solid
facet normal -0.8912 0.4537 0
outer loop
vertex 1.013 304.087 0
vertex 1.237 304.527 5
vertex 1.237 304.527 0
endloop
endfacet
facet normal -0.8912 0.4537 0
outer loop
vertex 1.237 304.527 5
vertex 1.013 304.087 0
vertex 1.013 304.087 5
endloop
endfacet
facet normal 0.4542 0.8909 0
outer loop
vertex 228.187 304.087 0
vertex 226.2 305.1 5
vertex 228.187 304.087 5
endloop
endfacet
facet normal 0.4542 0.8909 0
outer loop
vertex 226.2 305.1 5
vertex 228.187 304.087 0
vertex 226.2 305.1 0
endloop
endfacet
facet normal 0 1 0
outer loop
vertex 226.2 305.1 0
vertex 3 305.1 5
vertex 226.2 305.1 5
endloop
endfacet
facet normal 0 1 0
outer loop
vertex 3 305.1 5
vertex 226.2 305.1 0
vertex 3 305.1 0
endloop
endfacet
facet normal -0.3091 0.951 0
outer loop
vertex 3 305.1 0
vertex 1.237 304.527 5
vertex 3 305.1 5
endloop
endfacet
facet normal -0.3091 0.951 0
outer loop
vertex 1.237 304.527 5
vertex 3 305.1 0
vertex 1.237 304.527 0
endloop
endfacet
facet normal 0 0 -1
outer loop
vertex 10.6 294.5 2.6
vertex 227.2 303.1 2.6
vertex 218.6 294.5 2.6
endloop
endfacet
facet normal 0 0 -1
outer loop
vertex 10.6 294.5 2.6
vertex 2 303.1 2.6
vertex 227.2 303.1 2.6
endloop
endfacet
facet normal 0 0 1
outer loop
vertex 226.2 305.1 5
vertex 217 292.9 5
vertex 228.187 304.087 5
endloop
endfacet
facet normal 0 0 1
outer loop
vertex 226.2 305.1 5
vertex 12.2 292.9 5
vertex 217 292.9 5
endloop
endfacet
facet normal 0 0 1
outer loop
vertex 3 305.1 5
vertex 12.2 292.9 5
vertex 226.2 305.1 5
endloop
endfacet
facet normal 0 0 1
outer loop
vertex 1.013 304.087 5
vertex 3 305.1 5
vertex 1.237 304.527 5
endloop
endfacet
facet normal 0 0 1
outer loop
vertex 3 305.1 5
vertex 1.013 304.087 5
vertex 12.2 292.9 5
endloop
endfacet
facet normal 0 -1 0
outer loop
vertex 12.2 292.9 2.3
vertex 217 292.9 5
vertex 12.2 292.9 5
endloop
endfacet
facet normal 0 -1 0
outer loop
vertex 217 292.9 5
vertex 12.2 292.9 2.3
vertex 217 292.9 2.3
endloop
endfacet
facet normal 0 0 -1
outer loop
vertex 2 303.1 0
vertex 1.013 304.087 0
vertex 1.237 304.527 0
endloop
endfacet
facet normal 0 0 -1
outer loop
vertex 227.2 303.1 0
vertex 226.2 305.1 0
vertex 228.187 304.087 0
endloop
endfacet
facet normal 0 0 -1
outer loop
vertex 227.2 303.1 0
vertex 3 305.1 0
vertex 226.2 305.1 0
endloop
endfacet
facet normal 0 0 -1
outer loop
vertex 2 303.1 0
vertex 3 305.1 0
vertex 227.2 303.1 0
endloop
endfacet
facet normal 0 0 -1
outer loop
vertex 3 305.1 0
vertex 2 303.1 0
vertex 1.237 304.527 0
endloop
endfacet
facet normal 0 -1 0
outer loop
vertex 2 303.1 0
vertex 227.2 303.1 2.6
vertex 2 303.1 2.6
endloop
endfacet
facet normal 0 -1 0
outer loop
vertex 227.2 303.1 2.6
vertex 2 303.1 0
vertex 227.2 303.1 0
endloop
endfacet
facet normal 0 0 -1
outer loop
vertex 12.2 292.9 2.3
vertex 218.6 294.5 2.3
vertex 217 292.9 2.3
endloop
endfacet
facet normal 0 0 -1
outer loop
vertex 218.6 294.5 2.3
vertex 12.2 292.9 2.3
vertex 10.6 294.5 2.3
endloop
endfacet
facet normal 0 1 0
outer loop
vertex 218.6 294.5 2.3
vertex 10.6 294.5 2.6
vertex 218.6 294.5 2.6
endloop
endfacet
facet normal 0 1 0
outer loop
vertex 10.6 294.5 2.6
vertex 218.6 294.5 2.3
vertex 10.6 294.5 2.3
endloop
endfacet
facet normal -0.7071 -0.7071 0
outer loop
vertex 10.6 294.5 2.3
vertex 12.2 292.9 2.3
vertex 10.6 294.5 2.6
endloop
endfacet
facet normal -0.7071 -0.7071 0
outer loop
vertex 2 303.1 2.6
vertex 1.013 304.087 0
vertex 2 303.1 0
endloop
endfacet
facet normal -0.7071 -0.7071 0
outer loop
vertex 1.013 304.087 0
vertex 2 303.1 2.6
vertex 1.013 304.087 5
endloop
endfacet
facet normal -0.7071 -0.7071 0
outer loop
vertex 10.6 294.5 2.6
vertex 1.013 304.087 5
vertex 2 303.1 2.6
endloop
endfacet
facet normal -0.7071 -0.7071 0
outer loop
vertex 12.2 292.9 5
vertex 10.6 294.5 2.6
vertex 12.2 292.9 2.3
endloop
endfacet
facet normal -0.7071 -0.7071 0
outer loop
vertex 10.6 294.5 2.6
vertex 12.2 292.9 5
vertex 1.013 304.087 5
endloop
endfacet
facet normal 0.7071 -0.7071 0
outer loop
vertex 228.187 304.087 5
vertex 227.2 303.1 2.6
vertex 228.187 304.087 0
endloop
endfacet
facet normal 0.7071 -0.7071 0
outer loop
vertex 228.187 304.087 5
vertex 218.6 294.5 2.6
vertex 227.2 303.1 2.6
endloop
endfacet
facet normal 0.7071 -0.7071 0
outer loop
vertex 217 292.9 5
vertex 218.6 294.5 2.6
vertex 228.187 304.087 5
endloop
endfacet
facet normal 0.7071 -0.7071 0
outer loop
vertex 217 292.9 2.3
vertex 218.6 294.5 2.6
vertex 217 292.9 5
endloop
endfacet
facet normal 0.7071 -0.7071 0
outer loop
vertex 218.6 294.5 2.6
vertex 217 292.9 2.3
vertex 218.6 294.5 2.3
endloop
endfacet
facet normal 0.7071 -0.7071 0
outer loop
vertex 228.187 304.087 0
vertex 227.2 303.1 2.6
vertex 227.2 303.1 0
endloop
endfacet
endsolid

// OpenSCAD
// file: common.scad
// ============================================================
// Photo Frame for 13.3" Spectra 6 E-Ink Display
// Shared parameters and utility modules
// ============================================================

/* [Display Parameters] */
// Active (visible) area
active_w = 202.8;
active_h = 270.4;
// Glass outline dimensions
glass_w = 208.8;
glass_h = 284.7;
display_d = 0.85;
// Non-active border (asymmetric)
border_left   = 3.0;
border_right  = 3.0;
border_top    = 3.0;
border_bottom = 11.3;   // 284.7 - 270.4 - 3 = 11.3, FPC side, large non-active area

/* [Driver Board Parameters] */
board_w = 80;
board_h = 40;
board_d = 1.6;
board_clearance = 10;     // component height clearance

/* [Battery Parameters] */
battery_w = 60;
battery_h = 35;
battery_d = 8;

/* [Frame Parameters] */
bezel_w    = 10;          // bezel width around active area
wall_thick = 2.4;         // front frame thickness
back_thick = 1.2;         // back panel thickness (6 layers @ 0.2mm)
frame_d    = 2.6;         // total frame depth (1.2mm back + 1.4mm cavity)
tol        = 0.2;
corner_r   = 3;

/* [Channel Parameters] */
outer_wall  = 2.0;        // outer wall thickness on bezel
inner_lip_d = 0.3;        // inner lip depth (presses on display)
channel_tol = 0.2;        // clearance for back panel in channel
lip_overlap = 2.0;        // how much bezel overlaps the glass on each side

/* [Printer Limits] */
bed_max = 260;

/* [Stand Parameters] */
stand_angle = 12;         // tilt angle in degrees
stand_foot_depth = 100;   // how far the base extends back

/* [FPC Cable] */
// 60-pin FPC exits from bottom of display, offset 2mm to the right
fpc_w = 134;              // FPC ribbon width
fpc_slot_w = fpc_w + 8;   // slot width with clearance (+4mm wider)
fpc_offset_x = 2;         // shifted 2mm to the right from center
fpc_slot_h = 6;

/* [Buttons - 1 reset + 3 custom] */
button_dia     = 3.5;
button_spacing = 12;
button_count   = 4;

/* [Joint Parameters] */
tongue_depth  = 1.2;      // tongue-and-groove interlock depth
tongue_length = 15;        // each tongue segment length
tongue_count  = 4;         // number of tongue segments along width
screw_r       = 1.5;       // M3 screw radius

// ============================================================
// Derived dimensions
// ============================================================

cavity_w = glass_w + 2 * tol;
cavity_h = glass_h + 2 * tol;

frame_w = cavity_w + 2 * bezel_w;
frame_h = cavity_h + 2 * bezel_w;

// Back panel rim widths (design parameters)
panel_rim  = 8.2;    // rim on left, right, top
bottom_rim = 0.8;    // thin bottom rim (hidden in base)

// Derived panel dimensions
panel_w = cavity_w + 2 * panel_rim;
panel_h = cavity_h + panel_rim + bottom_rim;
panel_inset = (frame_w - panel_w) / 2;  // how far panel is inset from bezel edge

// Inner lip width: derived to fill gap between panel rim and window
// Layout: outer_wall + channel_tol + panel_rim + channel_tol + inner_lip_w = win_x
inner_lip_w = bezel_w + tol + lip_overlap - outer_wall - panel_rim - 2 * channel_tol;

// Back panel split: bottom piece as tall as fits the bed
back_split_y = bed_max - 10;   // 250mm from bottom, top piece ~60mm

// Base dimensions (foot/stand only, attaches to bottom of back panel)
base_wall = wall_thick;
base_total_depth = stand_foot_depth;

// ============================================================
// Utility modules
// ============================================================

module rounded_rect(w, h, d, r) {
    linear_extrude(d)
        offset(r = r)
            offset(r = -r)
                square([w, h]);
}

module rounded_rect_2d(w, h, r) {
    offset(r = r)
        offset(r = -r)
            square([w, h]);
}

// Tongue segments along X axis at a given Y position
module tongue_strip(width, y_pos, z_pos, depth, length, count) {
    spacing = width / (count + 1);
    for (i = [1 : count]) {
        translate([i * spacing - length / 2, y_pos, z_pos])
            cube([length, depth, back_thick]);
    }
}

// ============================================================
// Front bezel - mitered picture frame style (4 sides)
// ============================================================

// Window position and size (derived from glass position + lip overlap)
win_x = bezel_w + tol + lip_overlap;
win_y = bezel_w + tol + lip_overlap;
win_w = glass_w - 2 * lip_overlap;
win_h = glass_h - 2 * lip_overlap;

// Bezel Z layout:
//   z=0                           bottom of outer wall (back of frame)
//   z=frame_d                     bezel body bottom (= back panel top)
//   z=frame_d+wall_thick          bezel front face

module front_bezel_full() {
    union() {
        // 1. Bezel body (visible frame, sits on top of back panel)
        difference() {
            translate([0, 0, frame_d])
                rounded_rect(frame_w, frame_h, wall_thick, corner_r);

            // Window opening - sharp corners (display glass is rectangular)
            translate([win_x, win_y, -0.1])
                cube([win_w, win_h, frame_d + wall_thick + 0.2]);
        }

        // 2. Outer wall (wraps around back panel edge)
        difference() {
            rounded_rect(frame_w, frame_h, frame_d + wall_thick, corner_r);

            // Hollow inside - sharp corners
            translate([outer_wall, outer_wall, -0.1])
                cube([
                    frame_w - 2 * outer_wall,
                    frame_h - 2 * outer_wall,
                    frame_d + wall_thick + 0.2
                ]);
        }

        // 3. Inner lip (presses on display glass)
        difference() {
            translate([win_x - inner_lip_w, win_y - inner_lip_w, frame_d - inner_lip_d])
                cube([win_w + 2 * inner_lip_w, win_h + 2 * inner_lip_w, inner_lip_d]);

            translate([win_x, win_y, frame_d - inner_lip_d - 0.1])
                cube([win_w, win_h, inner_lip_d + 0.2]);
        }
    }
}

// 45-degree miter cutting regions for each side
// Each region is a 2D polygon extruded tall enough to cut the bezel
e = 1; // margin for clean cuts

// Bottom: below both 45° lines from bottom corners
module miter_region_bottom() {
    linear_extrude(50, center = true)
        polygon([[-e, -e], [frame_w + e, -e], [frame_w / 2, frame_w / 2]]);
}

// Top: above both 45° lines from top corners
module miter_region_top() {
    linear_extrude(50, center = true)
        polygon([[-e, frame_h + e], [frame_w + e, frame_h + e],
                 [frame_w / 2, frame_h - frame_w / 2]]);
}

// Left: between 45° lines from both left corners
module miter_region_left() {
    linear_extrude(50, center = true)
        polygon([[-e, -e], [frame_h / 2, frame_h / 2], [-e, frame_h + e]]);
}

// Right: between 45° lines from both right corners
module miter_region_right() {
    linear_extrude(50, center = true)
        polygon([[frame_w + e, -e],
                 [frame_w - frame_h / 2, frame_h / 2],
                 [frame_w + e, frame_h + e]]);
}

// Full back panel (smaller than bezel, fits inside channel)
module back_panel_full() {
    // FPC slot X position: centered + offset to the right
    fpc_x = (panel_w - fpc_slot_w) / 2 + fpc_offset_x;

    difference() {
        rounded_rect(panel_w, panel_h, frame_d, max(corner_r - panel_inset, 0.5));

        // Display cavity
        translate([panel_rim, bottom_rim, back_thick])
            cube([cavity_w, cavity_h, frame_d]);

        // FPC cable exit slot at bottom (offset 2mm to right)
        translate([fpc_x, -0.1, back_thick])
            cube([fpc_slot_w, bottom_rim + 0.1, frame_d - back_thick + 0.1]);

        // FPC ribbon gap: 4mm zone from panel bottom edge
        // Goes through the full back wall so ribbon can fold freely
        fpc_gap = 4;
        translate([fpc_x, 0, -0.1])
            cube([fpc_slot_w, fpc_gap, frame_d + 0.1]);
    }
}
// main file
// ============================================================
// Front Bezel - Top Side (mitered 45° corners)
// ============================================================
include <common.scad>

module bezel_top() {
    intersection() {
        front_bezel_full();
        miter_region_top();
    }
}

bezel_top();
